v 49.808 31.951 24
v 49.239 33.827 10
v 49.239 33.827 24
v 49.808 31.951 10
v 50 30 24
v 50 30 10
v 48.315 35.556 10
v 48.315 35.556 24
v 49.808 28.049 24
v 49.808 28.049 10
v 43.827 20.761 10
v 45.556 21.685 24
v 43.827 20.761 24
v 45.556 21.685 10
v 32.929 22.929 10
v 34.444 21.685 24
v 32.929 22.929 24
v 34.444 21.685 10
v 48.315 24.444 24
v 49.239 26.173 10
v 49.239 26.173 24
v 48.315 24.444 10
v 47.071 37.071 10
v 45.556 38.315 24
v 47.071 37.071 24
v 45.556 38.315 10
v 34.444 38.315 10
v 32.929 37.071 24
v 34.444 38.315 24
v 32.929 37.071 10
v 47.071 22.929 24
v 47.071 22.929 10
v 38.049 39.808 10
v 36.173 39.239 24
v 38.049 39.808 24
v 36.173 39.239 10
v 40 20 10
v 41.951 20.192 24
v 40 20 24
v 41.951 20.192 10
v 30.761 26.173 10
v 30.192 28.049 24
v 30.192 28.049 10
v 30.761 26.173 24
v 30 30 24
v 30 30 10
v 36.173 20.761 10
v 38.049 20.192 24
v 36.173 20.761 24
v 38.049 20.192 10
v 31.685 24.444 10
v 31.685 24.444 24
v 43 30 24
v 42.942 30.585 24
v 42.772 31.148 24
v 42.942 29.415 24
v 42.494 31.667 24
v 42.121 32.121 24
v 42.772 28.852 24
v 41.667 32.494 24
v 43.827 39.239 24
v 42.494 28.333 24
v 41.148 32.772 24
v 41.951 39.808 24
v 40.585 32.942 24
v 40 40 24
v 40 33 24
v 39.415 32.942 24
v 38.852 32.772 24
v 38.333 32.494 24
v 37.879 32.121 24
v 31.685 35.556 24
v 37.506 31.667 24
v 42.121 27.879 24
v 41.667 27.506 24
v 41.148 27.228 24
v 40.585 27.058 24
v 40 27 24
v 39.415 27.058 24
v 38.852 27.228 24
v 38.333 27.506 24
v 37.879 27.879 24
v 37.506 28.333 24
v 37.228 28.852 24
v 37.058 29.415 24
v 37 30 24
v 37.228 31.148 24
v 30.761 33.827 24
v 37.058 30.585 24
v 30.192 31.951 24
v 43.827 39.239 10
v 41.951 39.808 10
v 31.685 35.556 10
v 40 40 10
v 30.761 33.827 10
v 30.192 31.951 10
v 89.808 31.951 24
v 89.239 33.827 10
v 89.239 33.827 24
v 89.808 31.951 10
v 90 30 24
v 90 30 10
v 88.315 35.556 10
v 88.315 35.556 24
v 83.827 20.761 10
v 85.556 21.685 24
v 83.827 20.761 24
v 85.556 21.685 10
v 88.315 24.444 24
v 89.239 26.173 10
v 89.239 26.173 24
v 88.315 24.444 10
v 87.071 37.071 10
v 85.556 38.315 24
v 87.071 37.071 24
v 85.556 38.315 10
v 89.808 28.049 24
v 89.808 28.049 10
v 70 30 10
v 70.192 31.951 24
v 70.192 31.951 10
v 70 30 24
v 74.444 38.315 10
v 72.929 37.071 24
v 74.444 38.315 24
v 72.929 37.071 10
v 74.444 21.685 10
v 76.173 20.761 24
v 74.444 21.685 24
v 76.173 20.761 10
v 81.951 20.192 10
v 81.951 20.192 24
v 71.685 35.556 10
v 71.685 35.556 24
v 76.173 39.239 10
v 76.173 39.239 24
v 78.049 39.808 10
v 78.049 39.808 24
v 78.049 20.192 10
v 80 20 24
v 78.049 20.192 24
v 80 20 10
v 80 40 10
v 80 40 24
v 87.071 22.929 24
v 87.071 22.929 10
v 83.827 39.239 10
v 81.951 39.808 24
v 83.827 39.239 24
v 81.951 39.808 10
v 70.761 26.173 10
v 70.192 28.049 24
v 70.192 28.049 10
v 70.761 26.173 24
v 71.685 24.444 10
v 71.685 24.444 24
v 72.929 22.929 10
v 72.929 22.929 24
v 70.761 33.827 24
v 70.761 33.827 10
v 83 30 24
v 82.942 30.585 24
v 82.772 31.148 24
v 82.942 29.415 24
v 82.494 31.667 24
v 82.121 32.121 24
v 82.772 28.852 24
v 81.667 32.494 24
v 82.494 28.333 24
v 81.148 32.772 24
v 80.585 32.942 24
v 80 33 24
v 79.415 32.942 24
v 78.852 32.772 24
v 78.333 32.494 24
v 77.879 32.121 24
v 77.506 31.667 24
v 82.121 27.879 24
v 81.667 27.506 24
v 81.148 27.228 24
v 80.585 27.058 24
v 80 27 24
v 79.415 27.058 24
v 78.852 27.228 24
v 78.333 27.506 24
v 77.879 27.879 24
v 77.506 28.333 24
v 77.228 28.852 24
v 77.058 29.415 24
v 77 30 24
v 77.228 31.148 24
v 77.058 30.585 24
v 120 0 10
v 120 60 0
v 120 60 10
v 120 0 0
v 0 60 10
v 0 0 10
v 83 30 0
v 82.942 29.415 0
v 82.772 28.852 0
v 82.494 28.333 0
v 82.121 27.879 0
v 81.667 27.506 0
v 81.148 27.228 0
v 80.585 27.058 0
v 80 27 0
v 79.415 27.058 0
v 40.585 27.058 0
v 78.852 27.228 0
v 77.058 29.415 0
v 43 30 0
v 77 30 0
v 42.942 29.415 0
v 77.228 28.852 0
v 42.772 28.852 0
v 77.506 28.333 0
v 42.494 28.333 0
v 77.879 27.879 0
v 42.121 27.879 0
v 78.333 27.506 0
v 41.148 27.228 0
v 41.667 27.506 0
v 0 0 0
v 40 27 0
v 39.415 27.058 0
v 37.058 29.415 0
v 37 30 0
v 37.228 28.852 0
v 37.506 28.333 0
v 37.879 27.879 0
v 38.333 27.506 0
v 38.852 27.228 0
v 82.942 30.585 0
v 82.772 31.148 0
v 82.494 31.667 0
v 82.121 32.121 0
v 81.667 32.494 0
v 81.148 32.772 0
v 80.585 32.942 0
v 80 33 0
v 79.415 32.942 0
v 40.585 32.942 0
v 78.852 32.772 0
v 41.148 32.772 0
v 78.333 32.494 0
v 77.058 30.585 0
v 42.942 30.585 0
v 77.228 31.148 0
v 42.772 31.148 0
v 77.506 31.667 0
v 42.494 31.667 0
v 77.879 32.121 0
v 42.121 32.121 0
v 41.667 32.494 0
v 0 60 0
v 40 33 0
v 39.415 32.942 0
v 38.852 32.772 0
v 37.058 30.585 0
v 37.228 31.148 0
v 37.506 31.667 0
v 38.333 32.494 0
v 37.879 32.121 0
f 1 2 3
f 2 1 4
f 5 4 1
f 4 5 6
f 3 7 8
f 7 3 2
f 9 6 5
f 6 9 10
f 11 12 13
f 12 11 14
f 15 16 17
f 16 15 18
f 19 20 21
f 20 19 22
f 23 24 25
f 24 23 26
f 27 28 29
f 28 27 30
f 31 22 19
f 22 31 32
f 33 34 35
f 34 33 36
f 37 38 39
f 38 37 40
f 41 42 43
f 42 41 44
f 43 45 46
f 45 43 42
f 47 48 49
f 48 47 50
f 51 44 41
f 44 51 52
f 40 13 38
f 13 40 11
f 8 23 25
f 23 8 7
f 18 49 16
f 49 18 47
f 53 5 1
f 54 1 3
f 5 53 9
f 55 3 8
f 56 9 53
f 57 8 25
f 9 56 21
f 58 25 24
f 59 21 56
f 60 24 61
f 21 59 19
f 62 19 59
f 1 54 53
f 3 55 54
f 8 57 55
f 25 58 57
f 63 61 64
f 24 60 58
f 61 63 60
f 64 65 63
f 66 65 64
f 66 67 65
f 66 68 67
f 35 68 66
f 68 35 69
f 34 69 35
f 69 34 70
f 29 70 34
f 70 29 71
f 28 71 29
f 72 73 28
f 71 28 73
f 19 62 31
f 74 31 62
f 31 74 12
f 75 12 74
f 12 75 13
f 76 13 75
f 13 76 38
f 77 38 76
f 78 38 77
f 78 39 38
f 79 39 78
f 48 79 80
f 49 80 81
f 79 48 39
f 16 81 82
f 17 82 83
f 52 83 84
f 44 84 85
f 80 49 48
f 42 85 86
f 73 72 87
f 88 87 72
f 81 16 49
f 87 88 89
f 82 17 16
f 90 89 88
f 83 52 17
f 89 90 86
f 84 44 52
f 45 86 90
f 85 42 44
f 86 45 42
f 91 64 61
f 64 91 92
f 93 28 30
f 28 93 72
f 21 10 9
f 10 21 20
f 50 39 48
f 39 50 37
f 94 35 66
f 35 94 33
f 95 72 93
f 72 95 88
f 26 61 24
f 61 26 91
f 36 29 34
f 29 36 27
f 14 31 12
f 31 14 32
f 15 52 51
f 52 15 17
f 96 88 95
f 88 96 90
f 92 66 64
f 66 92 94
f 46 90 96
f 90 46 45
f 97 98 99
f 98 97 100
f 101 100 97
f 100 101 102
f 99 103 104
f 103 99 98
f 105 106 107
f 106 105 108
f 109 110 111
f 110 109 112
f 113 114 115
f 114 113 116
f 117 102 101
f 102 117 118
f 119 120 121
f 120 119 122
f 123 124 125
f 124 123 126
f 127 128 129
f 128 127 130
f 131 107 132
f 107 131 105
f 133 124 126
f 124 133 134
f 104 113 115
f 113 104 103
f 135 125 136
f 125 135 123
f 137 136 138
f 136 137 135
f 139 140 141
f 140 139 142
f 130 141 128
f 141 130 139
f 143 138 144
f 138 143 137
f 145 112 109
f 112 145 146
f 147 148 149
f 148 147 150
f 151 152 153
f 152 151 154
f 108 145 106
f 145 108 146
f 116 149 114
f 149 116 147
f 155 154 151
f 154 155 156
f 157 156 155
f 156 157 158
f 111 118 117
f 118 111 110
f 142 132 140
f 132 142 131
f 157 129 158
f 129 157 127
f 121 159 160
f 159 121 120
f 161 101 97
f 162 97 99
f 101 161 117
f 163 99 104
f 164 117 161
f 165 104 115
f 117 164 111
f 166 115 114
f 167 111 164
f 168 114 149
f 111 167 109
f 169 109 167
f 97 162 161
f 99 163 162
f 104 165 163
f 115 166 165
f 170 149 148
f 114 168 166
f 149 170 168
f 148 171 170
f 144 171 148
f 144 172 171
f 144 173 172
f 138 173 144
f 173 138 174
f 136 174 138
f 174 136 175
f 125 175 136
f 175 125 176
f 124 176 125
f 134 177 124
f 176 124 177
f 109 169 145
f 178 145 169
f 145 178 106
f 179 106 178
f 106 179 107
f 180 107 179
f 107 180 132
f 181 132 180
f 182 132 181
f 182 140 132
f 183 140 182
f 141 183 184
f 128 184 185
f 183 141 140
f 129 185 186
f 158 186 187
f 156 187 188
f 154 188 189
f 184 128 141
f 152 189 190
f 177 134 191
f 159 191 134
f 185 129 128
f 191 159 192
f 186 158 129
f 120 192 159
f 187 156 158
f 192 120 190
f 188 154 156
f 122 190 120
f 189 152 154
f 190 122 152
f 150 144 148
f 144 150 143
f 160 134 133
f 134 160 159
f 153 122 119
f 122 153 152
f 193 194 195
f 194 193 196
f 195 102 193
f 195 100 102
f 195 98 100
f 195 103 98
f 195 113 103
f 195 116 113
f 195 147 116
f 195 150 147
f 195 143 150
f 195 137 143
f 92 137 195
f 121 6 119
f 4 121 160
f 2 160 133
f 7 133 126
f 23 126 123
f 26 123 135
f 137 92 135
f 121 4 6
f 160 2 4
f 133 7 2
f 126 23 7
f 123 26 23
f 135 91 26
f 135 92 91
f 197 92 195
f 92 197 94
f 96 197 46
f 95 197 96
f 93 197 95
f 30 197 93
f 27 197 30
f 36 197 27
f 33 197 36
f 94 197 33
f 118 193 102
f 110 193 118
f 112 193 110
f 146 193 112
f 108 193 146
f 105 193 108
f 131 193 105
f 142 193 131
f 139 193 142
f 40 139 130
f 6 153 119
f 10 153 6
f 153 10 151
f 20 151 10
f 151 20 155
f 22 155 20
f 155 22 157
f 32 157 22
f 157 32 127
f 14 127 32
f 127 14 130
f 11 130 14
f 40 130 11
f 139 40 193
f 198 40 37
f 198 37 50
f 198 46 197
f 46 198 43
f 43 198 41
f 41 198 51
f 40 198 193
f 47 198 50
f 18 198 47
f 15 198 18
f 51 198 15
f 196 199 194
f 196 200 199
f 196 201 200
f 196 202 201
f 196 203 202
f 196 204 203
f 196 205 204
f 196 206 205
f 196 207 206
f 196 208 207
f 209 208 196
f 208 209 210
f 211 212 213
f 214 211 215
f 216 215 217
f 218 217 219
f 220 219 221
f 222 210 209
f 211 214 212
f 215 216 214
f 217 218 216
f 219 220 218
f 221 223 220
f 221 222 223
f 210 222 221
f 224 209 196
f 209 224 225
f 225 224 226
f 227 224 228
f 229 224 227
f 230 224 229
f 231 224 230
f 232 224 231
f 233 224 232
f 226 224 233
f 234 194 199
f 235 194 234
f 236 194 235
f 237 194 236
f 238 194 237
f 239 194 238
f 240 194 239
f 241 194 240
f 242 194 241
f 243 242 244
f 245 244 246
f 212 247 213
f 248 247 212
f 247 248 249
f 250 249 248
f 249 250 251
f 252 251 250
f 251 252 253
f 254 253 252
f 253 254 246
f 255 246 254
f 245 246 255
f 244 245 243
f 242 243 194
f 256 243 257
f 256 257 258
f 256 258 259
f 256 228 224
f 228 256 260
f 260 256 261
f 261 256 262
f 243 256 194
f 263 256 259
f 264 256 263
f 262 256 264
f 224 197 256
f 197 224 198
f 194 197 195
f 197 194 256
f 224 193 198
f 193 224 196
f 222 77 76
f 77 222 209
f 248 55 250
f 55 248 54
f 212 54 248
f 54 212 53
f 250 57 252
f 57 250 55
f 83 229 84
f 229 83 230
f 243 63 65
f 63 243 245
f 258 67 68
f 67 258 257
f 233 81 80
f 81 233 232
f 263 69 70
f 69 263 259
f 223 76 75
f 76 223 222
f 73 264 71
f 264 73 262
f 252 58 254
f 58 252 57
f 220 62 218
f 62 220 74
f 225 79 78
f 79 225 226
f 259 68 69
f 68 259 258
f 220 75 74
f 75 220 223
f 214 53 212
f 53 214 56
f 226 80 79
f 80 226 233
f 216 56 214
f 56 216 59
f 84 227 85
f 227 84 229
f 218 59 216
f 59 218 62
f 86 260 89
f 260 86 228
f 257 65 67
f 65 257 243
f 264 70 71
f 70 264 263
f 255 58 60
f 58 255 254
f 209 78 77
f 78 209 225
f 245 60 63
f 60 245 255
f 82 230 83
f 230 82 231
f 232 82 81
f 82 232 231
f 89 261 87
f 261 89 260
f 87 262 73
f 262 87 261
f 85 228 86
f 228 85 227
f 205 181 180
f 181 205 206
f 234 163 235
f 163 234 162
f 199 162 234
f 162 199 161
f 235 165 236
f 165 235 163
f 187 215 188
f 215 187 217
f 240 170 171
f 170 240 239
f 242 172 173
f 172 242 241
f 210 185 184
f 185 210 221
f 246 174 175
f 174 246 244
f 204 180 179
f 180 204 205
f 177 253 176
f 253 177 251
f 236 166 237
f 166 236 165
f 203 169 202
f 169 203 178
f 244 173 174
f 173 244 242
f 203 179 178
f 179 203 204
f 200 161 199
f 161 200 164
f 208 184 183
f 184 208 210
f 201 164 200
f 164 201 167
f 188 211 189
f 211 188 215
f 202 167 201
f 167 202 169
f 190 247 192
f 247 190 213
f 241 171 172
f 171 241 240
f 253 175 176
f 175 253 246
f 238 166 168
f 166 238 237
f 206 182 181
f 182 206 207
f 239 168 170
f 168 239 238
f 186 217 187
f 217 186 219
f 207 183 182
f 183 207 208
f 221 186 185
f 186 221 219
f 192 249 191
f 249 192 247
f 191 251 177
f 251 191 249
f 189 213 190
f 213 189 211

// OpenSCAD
$fn = 32;

// ----------------------------------------------------------------------
// Drill jig: two_boss jig
// ----------------------------------------------------------------------

// --- parameters (mm) ---
plate_l = 120;            // plate length, X
plate_w = 60;             // plate width, Y
plate_t = 10;             // plate thickness
boss_d = 20;              // guide boss diameter
boss_h = 15;              // boss height above the plate
guide_d = 6;              // guide hole diameter
boss_pitch = 40;          // boss pitch

n_boss = 2;  // guide bosses
boss_x0 = (plate_l - (n_boss - 1) * boss_pitch) / 2;  // first boss X
boss_top = plate_t - 1 + boss_h;  // boss crown height
total_h = boss_top;  // overall height

difference() {
  union() {
  cube([plate_l, plate_w, plate_t]);
  for (i = [0 : n_boss - 1])
    translate([boss_x0 + i * boss_pitch, plate_w / 2, plate_t - 1])
      cylinder(h = boss_h, d = boss_d);
  }
  for (i = [0 : n_boss - 1])
    translate([boss_x0 + i * boss_pitch, plate_w / 2, -1])
      cylinder(h = plate_t + boss_h, d = guide_d);
}
